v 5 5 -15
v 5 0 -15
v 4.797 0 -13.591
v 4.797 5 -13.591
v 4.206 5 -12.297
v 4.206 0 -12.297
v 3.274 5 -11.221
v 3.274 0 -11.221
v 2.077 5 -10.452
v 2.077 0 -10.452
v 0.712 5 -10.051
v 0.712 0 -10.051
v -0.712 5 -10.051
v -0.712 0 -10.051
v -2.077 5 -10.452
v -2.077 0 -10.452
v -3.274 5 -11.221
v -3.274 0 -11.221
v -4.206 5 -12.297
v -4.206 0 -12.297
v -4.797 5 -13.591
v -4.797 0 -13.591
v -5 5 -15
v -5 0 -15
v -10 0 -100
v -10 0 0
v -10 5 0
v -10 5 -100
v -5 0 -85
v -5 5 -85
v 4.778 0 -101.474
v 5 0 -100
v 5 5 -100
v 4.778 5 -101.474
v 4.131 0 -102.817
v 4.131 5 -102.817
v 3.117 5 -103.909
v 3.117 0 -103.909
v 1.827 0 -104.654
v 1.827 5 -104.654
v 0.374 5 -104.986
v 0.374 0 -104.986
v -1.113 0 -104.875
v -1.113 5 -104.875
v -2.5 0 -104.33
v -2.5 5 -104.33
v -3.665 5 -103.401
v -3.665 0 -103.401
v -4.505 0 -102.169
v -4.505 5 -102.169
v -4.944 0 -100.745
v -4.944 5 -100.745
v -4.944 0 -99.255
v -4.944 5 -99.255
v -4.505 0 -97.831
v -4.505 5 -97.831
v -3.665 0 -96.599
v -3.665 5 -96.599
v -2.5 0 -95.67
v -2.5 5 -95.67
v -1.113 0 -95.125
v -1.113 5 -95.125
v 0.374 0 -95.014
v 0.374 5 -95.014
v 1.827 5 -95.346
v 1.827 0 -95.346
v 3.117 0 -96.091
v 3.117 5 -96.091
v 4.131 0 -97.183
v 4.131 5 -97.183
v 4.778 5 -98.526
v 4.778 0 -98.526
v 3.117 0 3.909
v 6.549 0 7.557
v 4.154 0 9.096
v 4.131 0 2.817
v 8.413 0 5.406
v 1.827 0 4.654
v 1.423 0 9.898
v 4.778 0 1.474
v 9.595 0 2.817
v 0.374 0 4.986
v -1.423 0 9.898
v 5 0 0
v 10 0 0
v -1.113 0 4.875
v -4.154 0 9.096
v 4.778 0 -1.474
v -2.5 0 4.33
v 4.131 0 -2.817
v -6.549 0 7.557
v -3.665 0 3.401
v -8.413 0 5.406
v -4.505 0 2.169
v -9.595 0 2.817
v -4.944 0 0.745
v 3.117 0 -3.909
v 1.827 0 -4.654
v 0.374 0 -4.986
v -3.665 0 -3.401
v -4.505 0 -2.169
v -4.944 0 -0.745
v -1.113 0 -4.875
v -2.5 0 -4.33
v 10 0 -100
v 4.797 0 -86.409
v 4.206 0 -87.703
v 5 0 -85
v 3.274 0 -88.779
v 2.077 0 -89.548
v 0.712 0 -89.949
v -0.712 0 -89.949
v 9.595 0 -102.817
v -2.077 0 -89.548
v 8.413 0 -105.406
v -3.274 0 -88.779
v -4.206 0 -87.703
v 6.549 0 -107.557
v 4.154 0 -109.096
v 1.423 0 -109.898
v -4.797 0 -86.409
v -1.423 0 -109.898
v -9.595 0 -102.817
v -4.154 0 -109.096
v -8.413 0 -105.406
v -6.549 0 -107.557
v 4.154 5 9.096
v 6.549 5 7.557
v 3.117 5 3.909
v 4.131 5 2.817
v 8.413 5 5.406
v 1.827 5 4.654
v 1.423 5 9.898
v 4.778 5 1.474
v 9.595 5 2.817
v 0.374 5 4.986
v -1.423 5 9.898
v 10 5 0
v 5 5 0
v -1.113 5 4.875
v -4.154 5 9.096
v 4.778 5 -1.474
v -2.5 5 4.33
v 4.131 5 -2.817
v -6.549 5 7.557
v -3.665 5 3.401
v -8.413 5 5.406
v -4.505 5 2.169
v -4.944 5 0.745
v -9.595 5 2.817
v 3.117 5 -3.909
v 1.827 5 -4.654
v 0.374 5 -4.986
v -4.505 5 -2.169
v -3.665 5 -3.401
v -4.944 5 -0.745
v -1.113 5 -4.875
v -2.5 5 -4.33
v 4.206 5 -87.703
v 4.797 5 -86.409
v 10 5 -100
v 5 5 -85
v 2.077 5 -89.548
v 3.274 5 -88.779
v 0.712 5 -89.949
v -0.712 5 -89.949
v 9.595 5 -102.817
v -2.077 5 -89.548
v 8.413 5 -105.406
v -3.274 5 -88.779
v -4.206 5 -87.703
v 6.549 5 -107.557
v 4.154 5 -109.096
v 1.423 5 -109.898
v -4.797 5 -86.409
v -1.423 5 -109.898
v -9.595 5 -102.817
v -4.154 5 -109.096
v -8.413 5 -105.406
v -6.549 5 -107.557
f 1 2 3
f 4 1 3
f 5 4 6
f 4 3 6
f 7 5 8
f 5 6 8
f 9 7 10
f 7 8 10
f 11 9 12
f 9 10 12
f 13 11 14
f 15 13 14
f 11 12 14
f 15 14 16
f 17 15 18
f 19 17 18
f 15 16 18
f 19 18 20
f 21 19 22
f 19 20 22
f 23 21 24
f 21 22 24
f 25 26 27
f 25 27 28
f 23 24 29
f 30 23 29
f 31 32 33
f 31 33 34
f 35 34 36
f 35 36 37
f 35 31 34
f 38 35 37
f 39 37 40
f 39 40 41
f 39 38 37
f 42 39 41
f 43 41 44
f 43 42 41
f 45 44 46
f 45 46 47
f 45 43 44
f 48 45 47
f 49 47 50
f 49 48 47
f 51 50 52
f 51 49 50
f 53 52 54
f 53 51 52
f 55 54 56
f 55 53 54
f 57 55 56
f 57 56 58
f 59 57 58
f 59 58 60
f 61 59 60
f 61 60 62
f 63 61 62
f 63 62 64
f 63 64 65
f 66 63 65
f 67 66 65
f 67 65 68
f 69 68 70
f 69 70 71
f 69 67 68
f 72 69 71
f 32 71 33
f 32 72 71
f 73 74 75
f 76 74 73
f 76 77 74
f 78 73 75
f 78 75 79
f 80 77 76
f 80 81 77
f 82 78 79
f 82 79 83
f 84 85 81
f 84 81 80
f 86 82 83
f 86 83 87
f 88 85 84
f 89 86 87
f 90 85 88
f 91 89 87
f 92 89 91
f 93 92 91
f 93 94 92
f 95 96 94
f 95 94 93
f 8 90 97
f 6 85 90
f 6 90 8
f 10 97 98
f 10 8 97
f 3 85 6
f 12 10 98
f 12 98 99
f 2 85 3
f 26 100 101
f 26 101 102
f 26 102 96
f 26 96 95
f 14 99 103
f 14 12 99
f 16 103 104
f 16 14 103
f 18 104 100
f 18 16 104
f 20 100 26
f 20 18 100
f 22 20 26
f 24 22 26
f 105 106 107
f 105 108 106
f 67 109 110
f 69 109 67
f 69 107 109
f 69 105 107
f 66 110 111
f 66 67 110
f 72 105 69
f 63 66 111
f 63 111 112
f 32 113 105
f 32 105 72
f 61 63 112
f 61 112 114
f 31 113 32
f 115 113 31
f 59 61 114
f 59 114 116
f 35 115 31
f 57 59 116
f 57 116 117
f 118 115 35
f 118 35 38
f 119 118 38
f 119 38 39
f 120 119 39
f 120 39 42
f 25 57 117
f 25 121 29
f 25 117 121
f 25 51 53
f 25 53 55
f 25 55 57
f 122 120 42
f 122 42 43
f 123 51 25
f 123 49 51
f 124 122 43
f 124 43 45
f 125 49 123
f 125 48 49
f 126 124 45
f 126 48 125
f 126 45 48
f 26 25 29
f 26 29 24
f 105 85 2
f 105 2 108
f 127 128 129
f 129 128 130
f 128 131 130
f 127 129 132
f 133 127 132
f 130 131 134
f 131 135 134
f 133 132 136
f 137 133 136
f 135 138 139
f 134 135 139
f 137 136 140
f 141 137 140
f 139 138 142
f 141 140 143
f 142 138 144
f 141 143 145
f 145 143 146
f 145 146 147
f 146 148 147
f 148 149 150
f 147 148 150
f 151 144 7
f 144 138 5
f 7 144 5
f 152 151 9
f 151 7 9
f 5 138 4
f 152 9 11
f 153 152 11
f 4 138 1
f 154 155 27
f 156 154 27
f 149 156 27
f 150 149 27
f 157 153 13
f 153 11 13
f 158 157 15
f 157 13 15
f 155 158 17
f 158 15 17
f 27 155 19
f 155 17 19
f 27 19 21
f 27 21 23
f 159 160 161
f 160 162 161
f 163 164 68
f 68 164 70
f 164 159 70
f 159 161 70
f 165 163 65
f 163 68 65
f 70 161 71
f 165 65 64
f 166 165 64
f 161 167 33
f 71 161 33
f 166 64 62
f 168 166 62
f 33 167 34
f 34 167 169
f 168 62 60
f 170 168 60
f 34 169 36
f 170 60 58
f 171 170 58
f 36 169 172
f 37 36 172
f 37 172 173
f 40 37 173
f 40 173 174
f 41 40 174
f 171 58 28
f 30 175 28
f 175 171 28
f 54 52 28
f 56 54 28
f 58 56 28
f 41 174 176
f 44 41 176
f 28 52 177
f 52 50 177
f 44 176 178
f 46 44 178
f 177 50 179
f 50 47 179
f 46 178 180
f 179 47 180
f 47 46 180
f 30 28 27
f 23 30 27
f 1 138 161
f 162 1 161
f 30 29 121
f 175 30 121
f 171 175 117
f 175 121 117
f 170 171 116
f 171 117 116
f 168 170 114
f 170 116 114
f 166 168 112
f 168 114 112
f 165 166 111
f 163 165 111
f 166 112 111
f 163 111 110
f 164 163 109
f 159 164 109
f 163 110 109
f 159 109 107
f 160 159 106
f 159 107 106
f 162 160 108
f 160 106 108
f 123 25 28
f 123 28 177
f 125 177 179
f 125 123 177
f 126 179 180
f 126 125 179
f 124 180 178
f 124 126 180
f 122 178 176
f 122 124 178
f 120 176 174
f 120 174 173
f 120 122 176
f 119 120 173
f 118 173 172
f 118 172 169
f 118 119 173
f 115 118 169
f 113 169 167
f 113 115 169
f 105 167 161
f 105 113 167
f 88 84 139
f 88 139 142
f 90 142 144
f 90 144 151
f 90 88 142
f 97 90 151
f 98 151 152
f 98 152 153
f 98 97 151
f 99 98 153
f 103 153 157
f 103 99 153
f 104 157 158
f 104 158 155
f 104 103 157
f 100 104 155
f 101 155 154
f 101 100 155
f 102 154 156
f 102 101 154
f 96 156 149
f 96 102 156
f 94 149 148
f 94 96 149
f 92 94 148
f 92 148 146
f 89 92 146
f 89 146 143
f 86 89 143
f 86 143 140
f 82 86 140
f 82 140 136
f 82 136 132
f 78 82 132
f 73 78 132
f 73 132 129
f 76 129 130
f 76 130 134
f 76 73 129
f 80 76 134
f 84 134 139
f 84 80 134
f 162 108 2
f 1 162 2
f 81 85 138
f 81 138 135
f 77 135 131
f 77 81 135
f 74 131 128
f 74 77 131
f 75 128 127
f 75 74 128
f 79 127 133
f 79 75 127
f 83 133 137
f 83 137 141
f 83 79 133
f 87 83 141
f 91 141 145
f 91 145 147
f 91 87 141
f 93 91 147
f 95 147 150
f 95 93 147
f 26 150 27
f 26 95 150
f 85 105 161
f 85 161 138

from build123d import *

# Parameters (mm, degrees)
SKETCH1_R           = 5
BOSS_EXTRUDE1_DEPTH = 5


with BuildPart() as part:
    # Sketch1 → Boss-Extrude1 (new body)
    with BuildSketch(Plane(origin=(0, 0, 0), x_dir=(1, 0, 0), z_dir=(0, 1, 0))):
        with BuildLine():
            Line((-10, 0), (-10, 100))
            ThreePointArc((-10, 100), (0, 110), (10, 100))
            Line((10, 100), (10, 0))
            ThreePointArc((10, 0), (0, -10), (-10, 0))
        make_face()
        Circle(SKETCH1_R, mode=Mode.SUBTRACT)
        with Locations((0, 100)):
            Circle(SKETCH1_R, mode=Mode.SUBTRACT)
        with BuildLine():
            Line((5, 85), (5, 15))
            ThreePointArc((5, 15), (0, 10), (-5, 15))
            Line((-5, 15), (-5, 85))
            ThreePointArc((-5, 85), (0, 90), (5, 85))
        make_face(mode=Mode.SUBTRACT)
    extrude(amount=BOSS_EXTRUDE1_DEPTH)


solid = part.part
